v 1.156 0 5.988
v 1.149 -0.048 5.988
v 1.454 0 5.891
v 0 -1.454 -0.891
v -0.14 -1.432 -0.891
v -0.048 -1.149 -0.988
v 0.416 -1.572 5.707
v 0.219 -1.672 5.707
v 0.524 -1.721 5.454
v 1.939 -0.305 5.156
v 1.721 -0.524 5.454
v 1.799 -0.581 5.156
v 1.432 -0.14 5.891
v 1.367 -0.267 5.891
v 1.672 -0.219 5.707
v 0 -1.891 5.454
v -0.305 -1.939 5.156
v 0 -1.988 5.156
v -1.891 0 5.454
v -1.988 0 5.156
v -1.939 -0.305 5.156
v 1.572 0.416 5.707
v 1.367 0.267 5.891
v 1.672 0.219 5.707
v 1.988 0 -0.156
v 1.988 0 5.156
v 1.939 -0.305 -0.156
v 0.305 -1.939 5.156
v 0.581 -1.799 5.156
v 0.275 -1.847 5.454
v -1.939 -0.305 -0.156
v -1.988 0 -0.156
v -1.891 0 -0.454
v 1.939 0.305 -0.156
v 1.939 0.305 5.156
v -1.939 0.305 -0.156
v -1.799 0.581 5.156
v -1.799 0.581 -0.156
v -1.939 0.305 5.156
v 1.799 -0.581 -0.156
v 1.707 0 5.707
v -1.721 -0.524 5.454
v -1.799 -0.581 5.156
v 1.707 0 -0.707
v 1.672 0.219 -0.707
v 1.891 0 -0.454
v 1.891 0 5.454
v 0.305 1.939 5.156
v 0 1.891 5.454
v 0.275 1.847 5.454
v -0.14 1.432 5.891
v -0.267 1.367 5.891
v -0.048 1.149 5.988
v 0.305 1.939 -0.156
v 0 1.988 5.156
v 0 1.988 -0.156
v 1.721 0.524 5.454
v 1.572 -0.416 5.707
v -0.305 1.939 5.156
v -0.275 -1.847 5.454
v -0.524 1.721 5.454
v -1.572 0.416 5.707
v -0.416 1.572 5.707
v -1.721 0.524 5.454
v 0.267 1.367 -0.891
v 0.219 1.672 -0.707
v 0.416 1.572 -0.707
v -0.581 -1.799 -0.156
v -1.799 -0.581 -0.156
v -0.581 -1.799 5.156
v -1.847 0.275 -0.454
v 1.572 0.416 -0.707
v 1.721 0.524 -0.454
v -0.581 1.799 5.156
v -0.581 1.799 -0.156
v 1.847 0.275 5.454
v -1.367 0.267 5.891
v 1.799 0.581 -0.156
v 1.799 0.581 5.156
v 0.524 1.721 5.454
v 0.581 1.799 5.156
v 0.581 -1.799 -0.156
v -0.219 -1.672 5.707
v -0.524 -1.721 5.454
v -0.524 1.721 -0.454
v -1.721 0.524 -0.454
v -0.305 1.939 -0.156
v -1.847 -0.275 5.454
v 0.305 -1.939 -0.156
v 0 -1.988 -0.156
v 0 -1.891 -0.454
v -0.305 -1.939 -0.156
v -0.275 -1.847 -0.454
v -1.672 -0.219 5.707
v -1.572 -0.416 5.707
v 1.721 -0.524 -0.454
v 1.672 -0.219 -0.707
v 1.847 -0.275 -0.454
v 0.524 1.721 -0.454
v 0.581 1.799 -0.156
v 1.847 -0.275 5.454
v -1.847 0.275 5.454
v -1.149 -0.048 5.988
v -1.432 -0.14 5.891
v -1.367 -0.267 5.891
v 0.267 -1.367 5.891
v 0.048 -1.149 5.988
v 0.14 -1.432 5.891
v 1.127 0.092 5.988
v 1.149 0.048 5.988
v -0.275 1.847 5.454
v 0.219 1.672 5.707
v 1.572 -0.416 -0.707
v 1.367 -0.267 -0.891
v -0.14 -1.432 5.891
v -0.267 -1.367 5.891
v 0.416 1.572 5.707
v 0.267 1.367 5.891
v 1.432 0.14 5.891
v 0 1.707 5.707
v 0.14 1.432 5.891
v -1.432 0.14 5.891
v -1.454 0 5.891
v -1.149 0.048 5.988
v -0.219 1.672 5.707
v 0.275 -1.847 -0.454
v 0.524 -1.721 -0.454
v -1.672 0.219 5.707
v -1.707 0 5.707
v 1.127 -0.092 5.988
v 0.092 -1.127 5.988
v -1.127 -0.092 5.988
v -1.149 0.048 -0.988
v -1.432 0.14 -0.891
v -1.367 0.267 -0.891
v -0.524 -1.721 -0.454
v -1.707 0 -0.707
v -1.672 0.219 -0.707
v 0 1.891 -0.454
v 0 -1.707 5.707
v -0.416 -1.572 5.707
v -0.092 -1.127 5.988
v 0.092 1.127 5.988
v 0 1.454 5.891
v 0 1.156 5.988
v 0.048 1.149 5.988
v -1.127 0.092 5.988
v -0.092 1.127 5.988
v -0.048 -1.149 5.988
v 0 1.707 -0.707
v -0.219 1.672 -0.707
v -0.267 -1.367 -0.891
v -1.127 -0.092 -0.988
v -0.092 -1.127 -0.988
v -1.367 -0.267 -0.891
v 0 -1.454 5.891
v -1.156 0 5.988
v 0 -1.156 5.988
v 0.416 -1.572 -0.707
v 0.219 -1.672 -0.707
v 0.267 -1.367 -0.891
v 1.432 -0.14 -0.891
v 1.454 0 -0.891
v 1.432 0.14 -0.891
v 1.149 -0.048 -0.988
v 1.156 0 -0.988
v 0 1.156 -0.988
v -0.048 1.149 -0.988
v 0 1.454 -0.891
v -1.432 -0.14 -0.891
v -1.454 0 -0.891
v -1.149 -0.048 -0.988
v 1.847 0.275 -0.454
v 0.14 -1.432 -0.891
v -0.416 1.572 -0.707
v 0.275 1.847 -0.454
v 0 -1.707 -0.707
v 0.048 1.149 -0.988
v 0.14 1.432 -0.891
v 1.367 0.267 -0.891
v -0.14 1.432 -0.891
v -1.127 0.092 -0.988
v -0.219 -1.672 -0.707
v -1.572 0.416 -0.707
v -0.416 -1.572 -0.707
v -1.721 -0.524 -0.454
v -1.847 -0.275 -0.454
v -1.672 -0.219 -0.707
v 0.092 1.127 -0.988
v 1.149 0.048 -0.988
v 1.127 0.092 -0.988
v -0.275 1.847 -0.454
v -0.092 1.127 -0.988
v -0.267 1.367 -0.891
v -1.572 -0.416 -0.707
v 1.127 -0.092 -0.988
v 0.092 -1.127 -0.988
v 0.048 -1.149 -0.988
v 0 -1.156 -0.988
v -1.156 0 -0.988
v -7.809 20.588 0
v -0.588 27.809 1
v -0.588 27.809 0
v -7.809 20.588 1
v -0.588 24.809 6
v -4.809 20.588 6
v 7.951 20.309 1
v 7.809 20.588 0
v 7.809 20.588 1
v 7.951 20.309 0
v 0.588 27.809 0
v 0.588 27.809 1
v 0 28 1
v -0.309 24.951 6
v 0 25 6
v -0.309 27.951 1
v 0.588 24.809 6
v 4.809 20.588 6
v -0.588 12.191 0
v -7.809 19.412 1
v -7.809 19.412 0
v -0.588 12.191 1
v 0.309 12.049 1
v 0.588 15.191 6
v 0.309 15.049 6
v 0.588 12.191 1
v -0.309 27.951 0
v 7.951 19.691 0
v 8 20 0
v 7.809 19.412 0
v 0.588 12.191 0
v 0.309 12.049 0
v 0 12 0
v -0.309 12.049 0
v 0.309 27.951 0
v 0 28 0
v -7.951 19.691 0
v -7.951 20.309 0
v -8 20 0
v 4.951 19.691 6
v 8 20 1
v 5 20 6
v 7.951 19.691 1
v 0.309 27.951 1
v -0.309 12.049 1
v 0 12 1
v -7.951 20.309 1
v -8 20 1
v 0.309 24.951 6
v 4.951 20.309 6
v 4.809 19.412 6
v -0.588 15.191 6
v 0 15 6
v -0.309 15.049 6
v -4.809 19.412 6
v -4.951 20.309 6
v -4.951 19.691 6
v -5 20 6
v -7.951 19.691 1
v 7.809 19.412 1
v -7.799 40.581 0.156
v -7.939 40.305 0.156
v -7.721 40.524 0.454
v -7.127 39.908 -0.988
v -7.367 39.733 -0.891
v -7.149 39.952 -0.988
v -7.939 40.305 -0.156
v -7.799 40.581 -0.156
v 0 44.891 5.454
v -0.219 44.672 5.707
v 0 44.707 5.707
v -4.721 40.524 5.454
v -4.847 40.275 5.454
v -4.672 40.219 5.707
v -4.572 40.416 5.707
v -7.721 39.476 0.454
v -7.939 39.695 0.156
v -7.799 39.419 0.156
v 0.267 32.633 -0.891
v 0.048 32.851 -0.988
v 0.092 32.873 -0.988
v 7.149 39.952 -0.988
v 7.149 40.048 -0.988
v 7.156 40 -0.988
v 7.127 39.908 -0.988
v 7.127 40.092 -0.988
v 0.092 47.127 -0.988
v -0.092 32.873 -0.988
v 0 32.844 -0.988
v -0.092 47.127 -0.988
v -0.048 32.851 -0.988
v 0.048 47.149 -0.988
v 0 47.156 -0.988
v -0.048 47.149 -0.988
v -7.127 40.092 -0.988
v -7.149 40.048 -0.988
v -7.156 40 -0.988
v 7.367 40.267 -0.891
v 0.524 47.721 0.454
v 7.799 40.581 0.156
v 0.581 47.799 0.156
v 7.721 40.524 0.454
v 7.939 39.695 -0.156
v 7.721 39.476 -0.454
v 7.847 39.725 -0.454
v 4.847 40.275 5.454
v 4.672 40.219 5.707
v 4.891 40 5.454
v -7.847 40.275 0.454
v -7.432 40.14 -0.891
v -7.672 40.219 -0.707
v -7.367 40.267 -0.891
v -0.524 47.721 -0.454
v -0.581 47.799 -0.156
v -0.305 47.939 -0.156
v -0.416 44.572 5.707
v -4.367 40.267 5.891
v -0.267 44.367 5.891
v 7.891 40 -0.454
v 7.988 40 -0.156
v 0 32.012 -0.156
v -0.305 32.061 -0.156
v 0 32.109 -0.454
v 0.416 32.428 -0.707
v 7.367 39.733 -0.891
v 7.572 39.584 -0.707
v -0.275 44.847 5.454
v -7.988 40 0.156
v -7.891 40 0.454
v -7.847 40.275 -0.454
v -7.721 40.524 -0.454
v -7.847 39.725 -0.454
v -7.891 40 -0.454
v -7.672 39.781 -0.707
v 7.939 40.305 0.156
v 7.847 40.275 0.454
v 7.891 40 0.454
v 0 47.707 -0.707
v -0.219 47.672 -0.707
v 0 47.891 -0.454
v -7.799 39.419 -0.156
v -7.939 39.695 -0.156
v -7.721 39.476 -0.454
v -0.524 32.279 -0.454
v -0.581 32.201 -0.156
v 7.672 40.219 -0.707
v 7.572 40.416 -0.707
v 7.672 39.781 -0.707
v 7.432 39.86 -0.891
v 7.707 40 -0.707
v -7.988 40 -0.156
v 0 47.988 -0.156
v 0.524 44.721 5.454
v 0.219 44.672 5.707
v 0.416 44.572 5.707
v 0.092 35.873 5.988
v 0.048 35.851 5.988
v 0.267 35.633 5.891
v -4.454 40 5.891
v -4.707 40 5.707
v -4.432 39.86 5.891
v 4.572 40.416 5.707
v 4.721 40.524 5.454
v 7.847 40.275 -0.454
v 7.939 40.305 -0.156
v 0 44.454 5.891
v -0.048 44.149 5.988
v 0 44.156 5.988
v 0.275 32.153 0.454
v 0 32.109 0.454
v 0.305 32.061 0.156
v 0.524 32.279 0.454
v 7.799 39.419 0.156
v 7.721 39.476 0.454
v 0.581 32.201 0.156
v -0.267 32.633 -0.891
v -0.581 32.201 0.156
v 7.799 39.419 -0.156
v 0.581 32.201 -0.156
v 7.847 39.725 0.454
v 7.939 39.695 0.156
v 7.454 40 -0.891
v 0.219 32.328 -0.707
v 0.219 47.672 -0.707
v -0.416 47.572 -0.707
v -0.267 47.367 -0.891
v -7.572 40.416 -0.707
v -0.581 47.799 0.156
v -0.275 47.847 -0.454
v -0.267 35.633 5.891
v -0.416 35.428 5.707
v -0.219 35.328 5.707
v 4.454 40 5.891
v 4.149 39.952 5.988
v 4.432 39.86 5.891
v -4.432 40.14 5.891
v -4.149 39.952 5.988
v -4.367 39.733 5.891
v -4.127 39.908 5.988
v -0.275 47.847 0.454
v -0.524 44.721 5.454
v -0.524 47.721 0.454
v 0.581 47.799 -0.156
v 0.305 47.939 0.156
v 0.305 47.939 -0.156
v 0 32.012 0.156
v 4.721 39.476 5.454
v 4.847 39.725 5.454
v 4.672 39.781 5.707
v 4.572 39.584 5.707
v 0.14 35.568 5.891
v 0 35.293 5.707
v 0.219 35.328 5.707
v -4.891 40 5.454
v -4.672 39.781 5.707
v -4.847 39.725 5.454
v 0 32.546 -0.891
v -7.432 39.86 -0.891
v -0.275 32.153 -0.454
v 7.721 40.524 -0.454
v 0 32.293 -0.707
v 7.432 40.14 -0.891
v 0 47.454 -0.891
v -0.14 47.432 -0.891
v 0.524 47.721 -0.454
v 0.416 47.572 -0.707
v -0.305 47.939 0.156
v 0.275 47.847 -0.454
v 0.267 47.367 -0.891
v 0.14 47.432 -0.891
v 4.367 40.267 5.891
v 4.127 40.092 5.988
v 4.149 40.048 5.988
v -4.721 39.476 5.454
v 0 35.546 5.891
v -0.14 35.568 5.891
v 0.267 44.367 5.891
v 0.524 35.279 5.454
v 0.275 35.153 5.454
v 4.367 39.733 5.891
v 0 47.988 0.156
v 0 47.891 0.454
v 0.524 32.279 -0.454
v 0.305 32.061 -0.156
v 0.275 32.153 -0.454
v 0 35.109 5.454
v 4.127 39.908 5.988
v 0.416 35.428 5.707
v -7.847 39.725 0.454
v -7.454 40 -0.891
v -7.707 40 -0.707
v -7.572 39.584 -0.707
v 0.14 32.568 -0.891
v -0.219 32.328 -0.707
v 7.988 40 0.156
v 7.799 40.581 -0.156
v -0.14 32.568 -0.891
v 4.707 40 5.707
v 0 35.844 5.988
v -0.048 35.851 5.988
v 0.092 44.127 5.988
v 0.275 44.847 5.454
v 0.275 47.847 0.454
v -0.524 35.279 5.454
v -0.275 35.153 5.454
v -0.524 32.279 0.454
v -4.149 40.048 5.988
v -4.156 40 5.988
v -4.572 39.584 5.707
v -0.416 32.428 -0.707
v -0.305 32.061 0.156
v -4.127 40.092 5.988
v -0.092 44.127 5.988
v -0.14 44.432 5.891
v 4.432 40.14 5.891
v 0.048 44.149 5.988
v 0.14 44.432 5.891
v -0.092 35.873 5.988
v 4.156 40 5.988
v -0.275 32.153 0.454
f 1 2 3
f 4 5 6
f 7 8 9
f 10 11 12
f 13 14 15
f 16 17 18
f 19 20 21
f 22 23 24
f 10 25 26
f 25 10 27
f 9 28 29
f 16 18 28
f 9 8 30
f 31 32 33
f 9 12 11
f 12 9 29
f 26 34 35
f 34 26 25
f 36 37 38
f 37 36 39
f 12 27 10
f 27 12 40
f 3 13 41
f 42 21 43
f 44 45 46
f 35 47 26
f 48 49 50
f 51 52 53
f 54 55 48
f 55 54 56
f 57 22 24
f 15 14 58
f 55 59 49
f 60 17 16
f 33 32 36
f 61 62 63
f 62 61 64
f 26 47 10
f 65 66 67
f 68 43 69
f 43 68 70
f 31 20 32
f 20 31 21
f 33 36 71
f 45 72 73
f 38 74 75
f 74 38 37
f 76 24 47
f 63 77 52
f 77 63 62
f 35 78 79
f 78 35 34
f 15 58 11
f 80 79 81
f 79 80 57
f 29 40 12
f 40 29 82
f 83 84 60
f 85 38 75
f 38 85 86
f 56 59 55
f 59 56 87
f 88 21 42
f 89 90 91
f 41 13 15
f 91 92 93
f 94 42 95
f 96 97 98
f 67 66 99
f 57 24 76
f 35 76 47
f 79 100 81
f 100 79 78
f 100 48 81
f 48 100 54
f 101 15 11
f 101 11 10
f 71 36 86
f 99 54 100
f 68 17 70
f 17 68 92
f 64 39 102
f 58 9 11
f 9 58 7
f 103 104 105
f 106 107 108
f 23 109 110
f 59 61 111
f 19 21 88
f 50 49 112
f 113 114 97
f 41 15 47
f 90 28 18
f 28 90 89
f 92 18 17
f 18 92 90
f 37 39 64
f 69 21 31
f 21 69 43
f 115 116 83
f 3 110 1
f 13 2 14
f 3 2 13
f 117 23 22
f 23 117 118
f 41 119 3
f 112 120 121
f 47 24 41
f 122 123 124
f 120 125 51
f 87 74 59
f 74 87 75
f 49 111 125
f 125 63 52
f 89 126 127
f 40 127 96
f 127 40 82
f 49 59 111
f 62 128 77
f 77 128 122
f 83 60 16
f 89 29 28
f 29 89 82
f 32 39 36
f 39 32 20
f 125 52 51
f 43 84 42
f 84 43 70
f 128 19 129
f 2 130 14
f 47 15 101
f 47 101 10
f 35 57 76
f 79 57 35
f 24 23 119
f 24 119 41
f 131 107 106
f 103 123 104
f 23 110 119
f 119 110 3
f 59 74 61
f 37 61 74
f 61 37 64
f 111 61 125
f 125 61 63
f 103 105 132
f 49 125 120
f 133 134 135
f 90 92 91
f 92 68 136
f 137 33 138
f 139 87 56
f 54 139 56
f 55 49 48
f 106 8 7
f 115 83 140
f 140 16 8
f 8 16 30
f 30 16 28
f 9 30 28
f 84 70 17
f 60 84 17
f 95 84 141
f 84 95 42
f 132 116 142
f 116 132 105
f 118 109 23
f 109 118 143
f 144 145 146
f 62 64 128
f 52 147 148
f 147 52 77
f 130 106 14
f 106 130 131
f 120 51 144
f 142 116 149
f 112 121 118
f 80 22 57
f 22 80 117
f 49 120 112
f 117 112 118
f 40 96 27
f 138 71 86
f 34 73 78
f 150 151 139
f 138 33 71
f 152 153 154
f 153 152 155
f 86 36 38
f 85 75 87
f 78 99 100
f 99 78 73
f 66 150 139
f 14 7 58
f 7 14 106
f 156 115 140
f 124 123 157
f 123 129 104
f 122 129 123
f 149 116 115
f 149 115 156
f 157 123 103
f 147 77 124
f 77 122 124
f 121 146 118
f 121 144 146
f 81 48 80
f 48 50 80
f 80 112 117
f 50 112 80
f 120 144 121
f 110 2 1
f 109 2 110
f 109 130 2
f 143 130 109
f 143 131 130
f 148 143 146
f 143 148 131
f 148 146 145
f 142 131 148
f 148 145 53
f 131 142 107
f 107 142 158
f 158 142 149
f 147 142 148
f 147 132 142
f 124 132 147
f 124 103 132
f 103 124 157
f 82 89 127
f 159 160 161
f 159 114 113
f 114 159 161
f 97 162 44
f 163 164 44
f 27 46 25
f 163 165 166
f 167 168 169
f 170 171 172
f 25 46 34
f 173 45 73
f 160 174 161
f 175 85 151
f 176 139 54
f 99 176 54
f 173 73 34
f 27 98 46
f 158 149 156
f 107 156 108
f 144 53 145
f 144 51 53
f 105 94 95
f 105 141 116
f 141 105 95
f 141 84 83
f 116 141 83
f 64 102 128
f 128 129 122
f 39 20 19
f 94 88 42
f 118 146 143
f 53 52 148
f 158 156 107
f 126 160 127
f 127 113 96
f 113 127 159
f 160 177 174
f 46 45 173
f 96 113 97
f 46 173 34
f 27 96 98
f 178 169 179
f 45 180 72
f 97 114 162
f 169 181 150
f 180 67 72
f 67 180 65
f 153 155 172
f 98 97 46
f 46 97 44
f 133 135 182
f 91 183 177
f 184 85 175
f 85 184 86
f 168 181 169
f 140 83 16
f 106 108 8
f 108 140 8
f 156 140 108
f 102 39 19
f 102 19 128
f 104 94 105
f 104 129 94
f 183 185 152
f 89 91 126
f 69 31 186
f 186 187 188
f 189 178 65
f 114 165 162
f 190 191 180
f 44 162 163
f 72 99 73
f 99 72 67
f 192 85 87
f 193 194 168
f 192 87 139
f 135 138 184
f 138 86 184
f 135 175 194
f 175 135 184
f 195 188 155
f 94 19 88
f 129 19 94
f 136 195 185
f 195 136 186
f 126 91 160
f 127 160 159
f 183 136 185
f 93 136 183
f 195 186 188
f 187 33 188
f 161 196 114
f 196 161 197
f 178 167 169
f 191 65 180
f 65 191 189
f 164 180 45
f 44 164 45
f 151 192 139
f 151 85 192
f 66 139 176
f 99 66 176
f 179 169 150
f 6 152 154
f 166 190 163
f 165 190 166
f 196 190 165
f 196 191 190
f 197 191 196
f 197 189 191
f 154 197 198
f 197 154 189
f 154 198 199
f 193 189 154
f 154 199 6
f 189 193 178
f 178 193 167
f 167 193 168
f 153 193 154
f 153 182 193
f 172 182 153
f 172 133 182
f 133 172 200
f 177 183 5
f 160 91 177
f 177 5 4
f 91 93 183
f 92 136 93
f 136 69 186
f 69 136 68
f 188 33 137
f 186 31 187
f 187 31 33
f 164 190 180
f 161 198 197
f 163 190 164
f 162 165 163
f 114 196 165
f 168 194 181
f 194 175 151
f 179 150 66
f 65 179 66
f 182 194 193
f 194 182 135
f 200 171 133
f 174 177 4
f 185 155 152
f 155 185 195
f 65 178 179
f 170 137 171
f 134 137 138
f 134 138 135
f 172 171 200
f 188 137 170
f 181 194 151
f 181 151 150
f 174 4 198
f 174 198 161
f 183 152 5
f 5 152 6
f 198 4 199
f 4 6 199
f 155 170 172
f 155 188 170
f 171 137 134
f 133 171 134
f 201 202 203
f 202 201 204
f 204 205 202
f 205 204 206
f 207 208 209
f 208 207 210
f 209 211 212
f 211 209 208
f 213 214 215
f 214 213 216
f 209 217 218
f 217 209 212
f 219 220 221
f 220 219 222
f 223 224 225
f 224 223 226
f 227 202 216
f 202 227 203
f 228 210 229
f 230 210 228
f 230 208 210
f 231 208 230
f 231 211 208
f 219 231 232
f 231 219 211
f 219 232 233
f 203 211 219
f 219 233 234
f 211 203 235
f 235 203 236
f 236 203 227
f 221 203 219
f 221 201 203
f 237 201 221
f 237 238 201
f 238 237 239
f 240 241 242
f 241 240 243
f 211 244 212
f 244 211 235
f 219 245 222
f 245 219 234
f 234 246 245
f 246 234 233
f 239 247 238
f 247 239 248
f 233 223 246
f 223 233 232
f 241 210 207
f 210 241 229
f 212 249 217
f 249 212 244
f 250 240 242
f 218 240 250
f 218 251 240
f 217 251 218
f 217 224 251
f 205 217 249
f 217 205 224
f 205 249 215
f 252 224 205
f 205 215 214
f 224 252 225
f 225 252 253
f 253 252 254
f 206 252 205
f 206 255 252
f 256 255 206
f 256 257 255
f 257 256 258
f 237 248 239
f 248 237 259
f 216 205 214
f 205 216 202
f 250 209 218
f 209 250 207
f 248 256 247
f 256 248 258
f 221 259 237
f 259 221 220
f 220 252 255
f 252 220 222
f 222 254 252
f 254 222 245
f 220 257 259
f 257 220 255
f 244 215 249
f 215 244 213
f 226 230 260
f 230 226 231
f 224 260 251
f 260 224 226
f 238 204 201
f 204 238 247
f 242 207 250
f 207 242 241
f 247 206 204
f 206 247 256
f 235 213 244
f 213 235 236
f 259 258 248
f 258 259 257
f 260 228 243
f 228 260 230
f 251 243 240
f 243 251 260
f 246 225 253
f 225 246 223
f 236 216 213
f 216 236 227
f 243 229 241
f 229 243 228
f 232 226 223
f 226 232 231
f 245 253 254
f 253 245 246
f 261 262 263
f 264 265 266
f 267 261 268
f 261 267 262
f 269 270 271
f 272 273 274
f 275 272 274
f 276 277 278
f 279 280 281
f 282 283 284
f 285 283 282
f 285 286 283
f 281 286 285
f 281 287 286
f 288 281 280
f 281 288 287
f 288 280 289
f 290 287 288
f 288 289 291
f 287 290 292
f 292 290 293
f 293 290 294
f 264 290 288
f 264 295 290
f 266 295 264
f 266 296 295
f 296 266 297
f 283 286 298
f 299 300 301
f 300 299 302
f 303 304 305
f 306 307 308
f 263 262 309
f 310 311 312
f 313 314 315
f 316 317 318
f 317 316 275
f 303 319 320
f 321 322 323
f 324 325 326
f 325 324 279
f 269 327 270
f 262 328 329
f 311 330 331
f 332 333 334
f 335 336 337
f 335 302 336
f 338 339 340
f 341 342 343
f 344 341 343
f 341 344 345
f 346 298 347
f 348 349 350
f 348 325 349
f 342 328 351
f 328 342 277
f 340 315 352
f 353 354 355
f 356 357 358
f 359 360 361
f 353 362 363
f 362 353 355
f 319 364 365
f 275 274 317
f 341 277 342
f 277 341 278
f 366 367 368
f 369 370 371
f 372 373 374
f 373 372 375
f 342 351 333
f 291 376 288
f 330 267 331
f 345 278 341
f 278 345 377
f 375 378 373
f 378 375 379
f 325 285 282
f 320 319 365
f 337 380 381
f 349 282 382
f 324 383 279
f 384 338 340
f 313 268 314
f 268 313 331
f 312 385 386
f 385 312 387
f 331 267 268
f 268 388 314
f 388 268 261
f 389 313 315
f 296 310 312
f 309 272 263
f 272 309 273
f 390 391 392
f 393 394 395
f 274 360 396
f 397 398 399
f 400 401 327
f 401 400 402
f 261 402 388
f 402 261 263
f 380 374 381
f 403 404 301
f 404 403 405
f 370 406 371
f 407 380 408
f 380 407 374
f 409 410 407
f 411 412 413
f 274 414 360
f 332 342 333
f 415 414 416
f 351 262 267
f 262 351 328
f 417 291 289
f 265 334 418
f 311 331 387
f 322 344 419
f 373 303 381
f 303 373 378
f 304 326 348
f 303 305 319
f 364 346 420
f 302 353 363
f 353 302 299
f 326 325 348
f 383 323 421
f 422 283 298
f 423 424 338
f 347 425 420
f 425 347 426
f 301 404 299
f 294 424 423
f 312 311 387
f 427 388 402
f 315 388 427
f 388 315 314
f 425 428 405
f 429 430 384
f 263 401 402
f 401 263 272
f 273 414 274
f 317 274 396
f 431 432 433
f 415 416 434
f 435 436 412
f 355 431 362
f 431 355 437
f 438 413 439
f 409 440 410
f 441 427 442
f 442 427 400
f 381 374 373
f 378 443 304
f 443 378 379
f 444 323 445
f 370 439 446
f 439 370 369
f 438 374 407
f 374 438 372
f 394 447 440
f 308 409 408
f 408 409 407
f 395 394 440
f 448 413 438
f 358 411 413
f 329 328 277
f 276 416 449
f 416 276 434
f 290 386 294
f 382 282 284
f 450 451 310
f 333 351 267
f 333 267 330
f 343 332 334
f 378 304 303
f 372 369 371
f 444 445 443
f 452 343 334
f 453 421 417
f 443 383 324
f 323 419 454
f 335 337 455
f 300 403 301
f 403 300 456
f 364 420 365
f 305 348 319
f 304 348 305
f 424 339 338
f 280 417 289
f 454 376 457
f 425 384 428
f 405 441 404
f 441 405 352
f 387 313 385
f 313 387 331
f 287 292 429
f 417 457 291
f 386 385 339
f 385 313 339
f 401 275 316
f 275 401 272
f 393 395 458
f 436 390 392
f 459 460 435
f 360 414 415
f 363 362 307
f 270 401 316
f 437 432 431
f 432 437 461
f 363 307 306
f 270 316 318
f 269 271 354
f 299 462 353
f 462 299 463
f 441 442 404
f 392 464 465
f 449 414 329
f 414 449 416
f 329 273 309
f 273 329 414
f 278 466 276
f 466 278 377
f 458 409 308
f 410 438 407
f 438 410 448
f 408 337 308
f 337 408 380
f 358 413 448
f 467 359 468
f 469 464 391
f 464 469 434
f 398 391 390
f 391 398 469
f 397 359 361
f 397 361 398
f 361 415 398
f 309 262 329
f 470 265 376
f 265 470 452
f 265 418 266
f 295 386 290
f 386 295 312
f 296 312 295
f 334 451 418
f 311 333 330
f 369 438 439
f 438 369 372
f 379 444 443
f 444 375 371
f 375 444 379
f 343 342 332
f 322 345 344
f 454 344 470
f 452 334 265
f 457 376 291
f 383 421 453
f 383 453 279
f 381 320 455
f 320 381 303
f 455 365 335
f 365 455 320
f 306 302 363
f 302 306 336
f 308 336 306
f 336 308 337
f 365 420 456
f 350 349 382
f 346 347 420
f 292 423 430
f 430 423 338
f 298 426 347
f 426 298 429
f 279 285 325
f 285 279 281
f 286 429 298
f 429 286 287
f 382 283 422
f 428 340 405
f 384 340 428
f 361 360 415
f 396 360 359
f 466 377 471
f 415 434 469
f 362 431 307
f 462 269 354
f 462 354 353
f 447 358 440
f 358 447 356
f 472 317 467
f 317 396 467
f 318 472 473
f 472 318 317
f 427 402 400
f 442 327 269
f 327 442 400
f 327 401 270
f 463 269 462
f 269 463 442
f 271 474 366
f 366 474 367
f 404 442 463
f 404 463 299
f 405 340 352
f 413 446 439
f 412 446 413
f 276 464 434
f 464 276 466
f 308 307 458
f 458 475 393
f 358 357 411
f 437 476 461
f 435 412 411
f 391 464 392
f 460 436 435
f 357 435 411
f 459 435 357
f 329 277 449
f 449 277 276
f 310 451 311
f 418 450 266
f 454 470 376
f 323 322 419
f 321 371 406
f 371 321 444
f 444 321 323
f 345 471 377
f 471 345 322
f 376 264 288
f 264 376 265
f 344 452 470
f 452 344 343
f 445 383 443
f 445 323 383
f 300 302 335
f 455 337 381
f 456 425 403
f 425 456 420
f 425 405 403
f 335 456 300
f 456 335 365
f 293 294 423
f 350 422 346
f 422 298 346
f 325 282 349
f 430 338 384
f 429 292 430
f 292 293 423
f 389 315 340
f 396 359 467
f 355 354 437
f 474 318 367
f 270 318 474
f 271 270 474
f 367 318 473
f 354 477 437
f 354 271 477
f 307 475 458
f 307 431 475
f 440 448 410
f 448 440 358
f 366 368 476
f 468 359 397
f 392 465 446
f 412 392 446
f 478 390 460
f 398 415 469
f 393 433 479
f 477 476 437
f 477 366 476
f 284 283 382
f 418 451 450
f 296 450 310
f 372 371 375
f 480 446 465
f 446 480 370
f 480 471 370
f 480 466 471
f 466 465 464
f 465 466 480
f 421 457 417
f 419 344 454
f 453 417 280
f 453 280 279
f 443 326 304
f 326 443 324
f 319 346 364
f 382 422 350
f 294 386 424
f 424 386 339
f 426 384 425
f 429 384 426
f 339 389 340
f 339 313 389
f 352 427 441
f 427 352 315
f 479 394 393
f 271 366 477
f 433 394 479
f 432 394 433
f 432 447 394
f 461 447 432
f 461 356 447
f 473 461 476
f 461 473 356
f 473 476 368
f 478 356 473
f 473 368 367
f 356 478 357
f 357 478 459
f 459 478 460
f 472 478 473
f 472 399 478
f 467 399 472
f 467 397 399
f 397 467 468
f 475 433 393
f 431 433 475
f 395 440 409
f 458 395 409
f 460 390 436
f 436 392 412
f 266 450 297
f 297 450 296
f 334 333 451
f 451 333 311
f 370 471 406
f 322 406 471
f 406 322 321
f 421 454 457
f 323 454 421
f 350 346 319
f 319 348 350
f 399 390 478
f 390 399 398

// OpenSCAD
// file: ../../rounded-pyramid.scad
/**
 * 
 */
module roundedPyramid(h, r1, r2, cornerRadius, sides=30, sidesOnly=false)
//module roundedPyramid(size, cornerRadius, sides=30, sidesOnly=false)
{
	$fn=sides;
	
	minkowski()//size, cornerRadius)
	{
		cylinder(h=h, r1=r1, r2=r2, $fn=4);
	    
	    if(sidesOnly)
	    {
	    	cylinder(r=cornerRadius);
	    }
	    else
	    {
	    	sphere(r=cornerRadius);
	    	
    	}
	}	
}
// main file
use <../../rounded-pyramid.scad>

// this one has rounded a top/bottom as well as rounded sides.
color("orange")
roundedPyramid(h=5, sides=20);

// this one is shaped like a desktop keyboard keycap.
color("grey")
translate([0, 20, 0])
roundedPyramid(h=5,
	 			r1 = 7,
				r2 = 4,
				sides=20, sidesOnly=true);

// this one is shaped the keyboard keycap above but with all sides rounded
color("blue")
translate([0, 40, 0])
roundedPyramid(h=5,
				r1 = 7,
				r2 = 4,
				sides=20,
				sidesOnly=false);
